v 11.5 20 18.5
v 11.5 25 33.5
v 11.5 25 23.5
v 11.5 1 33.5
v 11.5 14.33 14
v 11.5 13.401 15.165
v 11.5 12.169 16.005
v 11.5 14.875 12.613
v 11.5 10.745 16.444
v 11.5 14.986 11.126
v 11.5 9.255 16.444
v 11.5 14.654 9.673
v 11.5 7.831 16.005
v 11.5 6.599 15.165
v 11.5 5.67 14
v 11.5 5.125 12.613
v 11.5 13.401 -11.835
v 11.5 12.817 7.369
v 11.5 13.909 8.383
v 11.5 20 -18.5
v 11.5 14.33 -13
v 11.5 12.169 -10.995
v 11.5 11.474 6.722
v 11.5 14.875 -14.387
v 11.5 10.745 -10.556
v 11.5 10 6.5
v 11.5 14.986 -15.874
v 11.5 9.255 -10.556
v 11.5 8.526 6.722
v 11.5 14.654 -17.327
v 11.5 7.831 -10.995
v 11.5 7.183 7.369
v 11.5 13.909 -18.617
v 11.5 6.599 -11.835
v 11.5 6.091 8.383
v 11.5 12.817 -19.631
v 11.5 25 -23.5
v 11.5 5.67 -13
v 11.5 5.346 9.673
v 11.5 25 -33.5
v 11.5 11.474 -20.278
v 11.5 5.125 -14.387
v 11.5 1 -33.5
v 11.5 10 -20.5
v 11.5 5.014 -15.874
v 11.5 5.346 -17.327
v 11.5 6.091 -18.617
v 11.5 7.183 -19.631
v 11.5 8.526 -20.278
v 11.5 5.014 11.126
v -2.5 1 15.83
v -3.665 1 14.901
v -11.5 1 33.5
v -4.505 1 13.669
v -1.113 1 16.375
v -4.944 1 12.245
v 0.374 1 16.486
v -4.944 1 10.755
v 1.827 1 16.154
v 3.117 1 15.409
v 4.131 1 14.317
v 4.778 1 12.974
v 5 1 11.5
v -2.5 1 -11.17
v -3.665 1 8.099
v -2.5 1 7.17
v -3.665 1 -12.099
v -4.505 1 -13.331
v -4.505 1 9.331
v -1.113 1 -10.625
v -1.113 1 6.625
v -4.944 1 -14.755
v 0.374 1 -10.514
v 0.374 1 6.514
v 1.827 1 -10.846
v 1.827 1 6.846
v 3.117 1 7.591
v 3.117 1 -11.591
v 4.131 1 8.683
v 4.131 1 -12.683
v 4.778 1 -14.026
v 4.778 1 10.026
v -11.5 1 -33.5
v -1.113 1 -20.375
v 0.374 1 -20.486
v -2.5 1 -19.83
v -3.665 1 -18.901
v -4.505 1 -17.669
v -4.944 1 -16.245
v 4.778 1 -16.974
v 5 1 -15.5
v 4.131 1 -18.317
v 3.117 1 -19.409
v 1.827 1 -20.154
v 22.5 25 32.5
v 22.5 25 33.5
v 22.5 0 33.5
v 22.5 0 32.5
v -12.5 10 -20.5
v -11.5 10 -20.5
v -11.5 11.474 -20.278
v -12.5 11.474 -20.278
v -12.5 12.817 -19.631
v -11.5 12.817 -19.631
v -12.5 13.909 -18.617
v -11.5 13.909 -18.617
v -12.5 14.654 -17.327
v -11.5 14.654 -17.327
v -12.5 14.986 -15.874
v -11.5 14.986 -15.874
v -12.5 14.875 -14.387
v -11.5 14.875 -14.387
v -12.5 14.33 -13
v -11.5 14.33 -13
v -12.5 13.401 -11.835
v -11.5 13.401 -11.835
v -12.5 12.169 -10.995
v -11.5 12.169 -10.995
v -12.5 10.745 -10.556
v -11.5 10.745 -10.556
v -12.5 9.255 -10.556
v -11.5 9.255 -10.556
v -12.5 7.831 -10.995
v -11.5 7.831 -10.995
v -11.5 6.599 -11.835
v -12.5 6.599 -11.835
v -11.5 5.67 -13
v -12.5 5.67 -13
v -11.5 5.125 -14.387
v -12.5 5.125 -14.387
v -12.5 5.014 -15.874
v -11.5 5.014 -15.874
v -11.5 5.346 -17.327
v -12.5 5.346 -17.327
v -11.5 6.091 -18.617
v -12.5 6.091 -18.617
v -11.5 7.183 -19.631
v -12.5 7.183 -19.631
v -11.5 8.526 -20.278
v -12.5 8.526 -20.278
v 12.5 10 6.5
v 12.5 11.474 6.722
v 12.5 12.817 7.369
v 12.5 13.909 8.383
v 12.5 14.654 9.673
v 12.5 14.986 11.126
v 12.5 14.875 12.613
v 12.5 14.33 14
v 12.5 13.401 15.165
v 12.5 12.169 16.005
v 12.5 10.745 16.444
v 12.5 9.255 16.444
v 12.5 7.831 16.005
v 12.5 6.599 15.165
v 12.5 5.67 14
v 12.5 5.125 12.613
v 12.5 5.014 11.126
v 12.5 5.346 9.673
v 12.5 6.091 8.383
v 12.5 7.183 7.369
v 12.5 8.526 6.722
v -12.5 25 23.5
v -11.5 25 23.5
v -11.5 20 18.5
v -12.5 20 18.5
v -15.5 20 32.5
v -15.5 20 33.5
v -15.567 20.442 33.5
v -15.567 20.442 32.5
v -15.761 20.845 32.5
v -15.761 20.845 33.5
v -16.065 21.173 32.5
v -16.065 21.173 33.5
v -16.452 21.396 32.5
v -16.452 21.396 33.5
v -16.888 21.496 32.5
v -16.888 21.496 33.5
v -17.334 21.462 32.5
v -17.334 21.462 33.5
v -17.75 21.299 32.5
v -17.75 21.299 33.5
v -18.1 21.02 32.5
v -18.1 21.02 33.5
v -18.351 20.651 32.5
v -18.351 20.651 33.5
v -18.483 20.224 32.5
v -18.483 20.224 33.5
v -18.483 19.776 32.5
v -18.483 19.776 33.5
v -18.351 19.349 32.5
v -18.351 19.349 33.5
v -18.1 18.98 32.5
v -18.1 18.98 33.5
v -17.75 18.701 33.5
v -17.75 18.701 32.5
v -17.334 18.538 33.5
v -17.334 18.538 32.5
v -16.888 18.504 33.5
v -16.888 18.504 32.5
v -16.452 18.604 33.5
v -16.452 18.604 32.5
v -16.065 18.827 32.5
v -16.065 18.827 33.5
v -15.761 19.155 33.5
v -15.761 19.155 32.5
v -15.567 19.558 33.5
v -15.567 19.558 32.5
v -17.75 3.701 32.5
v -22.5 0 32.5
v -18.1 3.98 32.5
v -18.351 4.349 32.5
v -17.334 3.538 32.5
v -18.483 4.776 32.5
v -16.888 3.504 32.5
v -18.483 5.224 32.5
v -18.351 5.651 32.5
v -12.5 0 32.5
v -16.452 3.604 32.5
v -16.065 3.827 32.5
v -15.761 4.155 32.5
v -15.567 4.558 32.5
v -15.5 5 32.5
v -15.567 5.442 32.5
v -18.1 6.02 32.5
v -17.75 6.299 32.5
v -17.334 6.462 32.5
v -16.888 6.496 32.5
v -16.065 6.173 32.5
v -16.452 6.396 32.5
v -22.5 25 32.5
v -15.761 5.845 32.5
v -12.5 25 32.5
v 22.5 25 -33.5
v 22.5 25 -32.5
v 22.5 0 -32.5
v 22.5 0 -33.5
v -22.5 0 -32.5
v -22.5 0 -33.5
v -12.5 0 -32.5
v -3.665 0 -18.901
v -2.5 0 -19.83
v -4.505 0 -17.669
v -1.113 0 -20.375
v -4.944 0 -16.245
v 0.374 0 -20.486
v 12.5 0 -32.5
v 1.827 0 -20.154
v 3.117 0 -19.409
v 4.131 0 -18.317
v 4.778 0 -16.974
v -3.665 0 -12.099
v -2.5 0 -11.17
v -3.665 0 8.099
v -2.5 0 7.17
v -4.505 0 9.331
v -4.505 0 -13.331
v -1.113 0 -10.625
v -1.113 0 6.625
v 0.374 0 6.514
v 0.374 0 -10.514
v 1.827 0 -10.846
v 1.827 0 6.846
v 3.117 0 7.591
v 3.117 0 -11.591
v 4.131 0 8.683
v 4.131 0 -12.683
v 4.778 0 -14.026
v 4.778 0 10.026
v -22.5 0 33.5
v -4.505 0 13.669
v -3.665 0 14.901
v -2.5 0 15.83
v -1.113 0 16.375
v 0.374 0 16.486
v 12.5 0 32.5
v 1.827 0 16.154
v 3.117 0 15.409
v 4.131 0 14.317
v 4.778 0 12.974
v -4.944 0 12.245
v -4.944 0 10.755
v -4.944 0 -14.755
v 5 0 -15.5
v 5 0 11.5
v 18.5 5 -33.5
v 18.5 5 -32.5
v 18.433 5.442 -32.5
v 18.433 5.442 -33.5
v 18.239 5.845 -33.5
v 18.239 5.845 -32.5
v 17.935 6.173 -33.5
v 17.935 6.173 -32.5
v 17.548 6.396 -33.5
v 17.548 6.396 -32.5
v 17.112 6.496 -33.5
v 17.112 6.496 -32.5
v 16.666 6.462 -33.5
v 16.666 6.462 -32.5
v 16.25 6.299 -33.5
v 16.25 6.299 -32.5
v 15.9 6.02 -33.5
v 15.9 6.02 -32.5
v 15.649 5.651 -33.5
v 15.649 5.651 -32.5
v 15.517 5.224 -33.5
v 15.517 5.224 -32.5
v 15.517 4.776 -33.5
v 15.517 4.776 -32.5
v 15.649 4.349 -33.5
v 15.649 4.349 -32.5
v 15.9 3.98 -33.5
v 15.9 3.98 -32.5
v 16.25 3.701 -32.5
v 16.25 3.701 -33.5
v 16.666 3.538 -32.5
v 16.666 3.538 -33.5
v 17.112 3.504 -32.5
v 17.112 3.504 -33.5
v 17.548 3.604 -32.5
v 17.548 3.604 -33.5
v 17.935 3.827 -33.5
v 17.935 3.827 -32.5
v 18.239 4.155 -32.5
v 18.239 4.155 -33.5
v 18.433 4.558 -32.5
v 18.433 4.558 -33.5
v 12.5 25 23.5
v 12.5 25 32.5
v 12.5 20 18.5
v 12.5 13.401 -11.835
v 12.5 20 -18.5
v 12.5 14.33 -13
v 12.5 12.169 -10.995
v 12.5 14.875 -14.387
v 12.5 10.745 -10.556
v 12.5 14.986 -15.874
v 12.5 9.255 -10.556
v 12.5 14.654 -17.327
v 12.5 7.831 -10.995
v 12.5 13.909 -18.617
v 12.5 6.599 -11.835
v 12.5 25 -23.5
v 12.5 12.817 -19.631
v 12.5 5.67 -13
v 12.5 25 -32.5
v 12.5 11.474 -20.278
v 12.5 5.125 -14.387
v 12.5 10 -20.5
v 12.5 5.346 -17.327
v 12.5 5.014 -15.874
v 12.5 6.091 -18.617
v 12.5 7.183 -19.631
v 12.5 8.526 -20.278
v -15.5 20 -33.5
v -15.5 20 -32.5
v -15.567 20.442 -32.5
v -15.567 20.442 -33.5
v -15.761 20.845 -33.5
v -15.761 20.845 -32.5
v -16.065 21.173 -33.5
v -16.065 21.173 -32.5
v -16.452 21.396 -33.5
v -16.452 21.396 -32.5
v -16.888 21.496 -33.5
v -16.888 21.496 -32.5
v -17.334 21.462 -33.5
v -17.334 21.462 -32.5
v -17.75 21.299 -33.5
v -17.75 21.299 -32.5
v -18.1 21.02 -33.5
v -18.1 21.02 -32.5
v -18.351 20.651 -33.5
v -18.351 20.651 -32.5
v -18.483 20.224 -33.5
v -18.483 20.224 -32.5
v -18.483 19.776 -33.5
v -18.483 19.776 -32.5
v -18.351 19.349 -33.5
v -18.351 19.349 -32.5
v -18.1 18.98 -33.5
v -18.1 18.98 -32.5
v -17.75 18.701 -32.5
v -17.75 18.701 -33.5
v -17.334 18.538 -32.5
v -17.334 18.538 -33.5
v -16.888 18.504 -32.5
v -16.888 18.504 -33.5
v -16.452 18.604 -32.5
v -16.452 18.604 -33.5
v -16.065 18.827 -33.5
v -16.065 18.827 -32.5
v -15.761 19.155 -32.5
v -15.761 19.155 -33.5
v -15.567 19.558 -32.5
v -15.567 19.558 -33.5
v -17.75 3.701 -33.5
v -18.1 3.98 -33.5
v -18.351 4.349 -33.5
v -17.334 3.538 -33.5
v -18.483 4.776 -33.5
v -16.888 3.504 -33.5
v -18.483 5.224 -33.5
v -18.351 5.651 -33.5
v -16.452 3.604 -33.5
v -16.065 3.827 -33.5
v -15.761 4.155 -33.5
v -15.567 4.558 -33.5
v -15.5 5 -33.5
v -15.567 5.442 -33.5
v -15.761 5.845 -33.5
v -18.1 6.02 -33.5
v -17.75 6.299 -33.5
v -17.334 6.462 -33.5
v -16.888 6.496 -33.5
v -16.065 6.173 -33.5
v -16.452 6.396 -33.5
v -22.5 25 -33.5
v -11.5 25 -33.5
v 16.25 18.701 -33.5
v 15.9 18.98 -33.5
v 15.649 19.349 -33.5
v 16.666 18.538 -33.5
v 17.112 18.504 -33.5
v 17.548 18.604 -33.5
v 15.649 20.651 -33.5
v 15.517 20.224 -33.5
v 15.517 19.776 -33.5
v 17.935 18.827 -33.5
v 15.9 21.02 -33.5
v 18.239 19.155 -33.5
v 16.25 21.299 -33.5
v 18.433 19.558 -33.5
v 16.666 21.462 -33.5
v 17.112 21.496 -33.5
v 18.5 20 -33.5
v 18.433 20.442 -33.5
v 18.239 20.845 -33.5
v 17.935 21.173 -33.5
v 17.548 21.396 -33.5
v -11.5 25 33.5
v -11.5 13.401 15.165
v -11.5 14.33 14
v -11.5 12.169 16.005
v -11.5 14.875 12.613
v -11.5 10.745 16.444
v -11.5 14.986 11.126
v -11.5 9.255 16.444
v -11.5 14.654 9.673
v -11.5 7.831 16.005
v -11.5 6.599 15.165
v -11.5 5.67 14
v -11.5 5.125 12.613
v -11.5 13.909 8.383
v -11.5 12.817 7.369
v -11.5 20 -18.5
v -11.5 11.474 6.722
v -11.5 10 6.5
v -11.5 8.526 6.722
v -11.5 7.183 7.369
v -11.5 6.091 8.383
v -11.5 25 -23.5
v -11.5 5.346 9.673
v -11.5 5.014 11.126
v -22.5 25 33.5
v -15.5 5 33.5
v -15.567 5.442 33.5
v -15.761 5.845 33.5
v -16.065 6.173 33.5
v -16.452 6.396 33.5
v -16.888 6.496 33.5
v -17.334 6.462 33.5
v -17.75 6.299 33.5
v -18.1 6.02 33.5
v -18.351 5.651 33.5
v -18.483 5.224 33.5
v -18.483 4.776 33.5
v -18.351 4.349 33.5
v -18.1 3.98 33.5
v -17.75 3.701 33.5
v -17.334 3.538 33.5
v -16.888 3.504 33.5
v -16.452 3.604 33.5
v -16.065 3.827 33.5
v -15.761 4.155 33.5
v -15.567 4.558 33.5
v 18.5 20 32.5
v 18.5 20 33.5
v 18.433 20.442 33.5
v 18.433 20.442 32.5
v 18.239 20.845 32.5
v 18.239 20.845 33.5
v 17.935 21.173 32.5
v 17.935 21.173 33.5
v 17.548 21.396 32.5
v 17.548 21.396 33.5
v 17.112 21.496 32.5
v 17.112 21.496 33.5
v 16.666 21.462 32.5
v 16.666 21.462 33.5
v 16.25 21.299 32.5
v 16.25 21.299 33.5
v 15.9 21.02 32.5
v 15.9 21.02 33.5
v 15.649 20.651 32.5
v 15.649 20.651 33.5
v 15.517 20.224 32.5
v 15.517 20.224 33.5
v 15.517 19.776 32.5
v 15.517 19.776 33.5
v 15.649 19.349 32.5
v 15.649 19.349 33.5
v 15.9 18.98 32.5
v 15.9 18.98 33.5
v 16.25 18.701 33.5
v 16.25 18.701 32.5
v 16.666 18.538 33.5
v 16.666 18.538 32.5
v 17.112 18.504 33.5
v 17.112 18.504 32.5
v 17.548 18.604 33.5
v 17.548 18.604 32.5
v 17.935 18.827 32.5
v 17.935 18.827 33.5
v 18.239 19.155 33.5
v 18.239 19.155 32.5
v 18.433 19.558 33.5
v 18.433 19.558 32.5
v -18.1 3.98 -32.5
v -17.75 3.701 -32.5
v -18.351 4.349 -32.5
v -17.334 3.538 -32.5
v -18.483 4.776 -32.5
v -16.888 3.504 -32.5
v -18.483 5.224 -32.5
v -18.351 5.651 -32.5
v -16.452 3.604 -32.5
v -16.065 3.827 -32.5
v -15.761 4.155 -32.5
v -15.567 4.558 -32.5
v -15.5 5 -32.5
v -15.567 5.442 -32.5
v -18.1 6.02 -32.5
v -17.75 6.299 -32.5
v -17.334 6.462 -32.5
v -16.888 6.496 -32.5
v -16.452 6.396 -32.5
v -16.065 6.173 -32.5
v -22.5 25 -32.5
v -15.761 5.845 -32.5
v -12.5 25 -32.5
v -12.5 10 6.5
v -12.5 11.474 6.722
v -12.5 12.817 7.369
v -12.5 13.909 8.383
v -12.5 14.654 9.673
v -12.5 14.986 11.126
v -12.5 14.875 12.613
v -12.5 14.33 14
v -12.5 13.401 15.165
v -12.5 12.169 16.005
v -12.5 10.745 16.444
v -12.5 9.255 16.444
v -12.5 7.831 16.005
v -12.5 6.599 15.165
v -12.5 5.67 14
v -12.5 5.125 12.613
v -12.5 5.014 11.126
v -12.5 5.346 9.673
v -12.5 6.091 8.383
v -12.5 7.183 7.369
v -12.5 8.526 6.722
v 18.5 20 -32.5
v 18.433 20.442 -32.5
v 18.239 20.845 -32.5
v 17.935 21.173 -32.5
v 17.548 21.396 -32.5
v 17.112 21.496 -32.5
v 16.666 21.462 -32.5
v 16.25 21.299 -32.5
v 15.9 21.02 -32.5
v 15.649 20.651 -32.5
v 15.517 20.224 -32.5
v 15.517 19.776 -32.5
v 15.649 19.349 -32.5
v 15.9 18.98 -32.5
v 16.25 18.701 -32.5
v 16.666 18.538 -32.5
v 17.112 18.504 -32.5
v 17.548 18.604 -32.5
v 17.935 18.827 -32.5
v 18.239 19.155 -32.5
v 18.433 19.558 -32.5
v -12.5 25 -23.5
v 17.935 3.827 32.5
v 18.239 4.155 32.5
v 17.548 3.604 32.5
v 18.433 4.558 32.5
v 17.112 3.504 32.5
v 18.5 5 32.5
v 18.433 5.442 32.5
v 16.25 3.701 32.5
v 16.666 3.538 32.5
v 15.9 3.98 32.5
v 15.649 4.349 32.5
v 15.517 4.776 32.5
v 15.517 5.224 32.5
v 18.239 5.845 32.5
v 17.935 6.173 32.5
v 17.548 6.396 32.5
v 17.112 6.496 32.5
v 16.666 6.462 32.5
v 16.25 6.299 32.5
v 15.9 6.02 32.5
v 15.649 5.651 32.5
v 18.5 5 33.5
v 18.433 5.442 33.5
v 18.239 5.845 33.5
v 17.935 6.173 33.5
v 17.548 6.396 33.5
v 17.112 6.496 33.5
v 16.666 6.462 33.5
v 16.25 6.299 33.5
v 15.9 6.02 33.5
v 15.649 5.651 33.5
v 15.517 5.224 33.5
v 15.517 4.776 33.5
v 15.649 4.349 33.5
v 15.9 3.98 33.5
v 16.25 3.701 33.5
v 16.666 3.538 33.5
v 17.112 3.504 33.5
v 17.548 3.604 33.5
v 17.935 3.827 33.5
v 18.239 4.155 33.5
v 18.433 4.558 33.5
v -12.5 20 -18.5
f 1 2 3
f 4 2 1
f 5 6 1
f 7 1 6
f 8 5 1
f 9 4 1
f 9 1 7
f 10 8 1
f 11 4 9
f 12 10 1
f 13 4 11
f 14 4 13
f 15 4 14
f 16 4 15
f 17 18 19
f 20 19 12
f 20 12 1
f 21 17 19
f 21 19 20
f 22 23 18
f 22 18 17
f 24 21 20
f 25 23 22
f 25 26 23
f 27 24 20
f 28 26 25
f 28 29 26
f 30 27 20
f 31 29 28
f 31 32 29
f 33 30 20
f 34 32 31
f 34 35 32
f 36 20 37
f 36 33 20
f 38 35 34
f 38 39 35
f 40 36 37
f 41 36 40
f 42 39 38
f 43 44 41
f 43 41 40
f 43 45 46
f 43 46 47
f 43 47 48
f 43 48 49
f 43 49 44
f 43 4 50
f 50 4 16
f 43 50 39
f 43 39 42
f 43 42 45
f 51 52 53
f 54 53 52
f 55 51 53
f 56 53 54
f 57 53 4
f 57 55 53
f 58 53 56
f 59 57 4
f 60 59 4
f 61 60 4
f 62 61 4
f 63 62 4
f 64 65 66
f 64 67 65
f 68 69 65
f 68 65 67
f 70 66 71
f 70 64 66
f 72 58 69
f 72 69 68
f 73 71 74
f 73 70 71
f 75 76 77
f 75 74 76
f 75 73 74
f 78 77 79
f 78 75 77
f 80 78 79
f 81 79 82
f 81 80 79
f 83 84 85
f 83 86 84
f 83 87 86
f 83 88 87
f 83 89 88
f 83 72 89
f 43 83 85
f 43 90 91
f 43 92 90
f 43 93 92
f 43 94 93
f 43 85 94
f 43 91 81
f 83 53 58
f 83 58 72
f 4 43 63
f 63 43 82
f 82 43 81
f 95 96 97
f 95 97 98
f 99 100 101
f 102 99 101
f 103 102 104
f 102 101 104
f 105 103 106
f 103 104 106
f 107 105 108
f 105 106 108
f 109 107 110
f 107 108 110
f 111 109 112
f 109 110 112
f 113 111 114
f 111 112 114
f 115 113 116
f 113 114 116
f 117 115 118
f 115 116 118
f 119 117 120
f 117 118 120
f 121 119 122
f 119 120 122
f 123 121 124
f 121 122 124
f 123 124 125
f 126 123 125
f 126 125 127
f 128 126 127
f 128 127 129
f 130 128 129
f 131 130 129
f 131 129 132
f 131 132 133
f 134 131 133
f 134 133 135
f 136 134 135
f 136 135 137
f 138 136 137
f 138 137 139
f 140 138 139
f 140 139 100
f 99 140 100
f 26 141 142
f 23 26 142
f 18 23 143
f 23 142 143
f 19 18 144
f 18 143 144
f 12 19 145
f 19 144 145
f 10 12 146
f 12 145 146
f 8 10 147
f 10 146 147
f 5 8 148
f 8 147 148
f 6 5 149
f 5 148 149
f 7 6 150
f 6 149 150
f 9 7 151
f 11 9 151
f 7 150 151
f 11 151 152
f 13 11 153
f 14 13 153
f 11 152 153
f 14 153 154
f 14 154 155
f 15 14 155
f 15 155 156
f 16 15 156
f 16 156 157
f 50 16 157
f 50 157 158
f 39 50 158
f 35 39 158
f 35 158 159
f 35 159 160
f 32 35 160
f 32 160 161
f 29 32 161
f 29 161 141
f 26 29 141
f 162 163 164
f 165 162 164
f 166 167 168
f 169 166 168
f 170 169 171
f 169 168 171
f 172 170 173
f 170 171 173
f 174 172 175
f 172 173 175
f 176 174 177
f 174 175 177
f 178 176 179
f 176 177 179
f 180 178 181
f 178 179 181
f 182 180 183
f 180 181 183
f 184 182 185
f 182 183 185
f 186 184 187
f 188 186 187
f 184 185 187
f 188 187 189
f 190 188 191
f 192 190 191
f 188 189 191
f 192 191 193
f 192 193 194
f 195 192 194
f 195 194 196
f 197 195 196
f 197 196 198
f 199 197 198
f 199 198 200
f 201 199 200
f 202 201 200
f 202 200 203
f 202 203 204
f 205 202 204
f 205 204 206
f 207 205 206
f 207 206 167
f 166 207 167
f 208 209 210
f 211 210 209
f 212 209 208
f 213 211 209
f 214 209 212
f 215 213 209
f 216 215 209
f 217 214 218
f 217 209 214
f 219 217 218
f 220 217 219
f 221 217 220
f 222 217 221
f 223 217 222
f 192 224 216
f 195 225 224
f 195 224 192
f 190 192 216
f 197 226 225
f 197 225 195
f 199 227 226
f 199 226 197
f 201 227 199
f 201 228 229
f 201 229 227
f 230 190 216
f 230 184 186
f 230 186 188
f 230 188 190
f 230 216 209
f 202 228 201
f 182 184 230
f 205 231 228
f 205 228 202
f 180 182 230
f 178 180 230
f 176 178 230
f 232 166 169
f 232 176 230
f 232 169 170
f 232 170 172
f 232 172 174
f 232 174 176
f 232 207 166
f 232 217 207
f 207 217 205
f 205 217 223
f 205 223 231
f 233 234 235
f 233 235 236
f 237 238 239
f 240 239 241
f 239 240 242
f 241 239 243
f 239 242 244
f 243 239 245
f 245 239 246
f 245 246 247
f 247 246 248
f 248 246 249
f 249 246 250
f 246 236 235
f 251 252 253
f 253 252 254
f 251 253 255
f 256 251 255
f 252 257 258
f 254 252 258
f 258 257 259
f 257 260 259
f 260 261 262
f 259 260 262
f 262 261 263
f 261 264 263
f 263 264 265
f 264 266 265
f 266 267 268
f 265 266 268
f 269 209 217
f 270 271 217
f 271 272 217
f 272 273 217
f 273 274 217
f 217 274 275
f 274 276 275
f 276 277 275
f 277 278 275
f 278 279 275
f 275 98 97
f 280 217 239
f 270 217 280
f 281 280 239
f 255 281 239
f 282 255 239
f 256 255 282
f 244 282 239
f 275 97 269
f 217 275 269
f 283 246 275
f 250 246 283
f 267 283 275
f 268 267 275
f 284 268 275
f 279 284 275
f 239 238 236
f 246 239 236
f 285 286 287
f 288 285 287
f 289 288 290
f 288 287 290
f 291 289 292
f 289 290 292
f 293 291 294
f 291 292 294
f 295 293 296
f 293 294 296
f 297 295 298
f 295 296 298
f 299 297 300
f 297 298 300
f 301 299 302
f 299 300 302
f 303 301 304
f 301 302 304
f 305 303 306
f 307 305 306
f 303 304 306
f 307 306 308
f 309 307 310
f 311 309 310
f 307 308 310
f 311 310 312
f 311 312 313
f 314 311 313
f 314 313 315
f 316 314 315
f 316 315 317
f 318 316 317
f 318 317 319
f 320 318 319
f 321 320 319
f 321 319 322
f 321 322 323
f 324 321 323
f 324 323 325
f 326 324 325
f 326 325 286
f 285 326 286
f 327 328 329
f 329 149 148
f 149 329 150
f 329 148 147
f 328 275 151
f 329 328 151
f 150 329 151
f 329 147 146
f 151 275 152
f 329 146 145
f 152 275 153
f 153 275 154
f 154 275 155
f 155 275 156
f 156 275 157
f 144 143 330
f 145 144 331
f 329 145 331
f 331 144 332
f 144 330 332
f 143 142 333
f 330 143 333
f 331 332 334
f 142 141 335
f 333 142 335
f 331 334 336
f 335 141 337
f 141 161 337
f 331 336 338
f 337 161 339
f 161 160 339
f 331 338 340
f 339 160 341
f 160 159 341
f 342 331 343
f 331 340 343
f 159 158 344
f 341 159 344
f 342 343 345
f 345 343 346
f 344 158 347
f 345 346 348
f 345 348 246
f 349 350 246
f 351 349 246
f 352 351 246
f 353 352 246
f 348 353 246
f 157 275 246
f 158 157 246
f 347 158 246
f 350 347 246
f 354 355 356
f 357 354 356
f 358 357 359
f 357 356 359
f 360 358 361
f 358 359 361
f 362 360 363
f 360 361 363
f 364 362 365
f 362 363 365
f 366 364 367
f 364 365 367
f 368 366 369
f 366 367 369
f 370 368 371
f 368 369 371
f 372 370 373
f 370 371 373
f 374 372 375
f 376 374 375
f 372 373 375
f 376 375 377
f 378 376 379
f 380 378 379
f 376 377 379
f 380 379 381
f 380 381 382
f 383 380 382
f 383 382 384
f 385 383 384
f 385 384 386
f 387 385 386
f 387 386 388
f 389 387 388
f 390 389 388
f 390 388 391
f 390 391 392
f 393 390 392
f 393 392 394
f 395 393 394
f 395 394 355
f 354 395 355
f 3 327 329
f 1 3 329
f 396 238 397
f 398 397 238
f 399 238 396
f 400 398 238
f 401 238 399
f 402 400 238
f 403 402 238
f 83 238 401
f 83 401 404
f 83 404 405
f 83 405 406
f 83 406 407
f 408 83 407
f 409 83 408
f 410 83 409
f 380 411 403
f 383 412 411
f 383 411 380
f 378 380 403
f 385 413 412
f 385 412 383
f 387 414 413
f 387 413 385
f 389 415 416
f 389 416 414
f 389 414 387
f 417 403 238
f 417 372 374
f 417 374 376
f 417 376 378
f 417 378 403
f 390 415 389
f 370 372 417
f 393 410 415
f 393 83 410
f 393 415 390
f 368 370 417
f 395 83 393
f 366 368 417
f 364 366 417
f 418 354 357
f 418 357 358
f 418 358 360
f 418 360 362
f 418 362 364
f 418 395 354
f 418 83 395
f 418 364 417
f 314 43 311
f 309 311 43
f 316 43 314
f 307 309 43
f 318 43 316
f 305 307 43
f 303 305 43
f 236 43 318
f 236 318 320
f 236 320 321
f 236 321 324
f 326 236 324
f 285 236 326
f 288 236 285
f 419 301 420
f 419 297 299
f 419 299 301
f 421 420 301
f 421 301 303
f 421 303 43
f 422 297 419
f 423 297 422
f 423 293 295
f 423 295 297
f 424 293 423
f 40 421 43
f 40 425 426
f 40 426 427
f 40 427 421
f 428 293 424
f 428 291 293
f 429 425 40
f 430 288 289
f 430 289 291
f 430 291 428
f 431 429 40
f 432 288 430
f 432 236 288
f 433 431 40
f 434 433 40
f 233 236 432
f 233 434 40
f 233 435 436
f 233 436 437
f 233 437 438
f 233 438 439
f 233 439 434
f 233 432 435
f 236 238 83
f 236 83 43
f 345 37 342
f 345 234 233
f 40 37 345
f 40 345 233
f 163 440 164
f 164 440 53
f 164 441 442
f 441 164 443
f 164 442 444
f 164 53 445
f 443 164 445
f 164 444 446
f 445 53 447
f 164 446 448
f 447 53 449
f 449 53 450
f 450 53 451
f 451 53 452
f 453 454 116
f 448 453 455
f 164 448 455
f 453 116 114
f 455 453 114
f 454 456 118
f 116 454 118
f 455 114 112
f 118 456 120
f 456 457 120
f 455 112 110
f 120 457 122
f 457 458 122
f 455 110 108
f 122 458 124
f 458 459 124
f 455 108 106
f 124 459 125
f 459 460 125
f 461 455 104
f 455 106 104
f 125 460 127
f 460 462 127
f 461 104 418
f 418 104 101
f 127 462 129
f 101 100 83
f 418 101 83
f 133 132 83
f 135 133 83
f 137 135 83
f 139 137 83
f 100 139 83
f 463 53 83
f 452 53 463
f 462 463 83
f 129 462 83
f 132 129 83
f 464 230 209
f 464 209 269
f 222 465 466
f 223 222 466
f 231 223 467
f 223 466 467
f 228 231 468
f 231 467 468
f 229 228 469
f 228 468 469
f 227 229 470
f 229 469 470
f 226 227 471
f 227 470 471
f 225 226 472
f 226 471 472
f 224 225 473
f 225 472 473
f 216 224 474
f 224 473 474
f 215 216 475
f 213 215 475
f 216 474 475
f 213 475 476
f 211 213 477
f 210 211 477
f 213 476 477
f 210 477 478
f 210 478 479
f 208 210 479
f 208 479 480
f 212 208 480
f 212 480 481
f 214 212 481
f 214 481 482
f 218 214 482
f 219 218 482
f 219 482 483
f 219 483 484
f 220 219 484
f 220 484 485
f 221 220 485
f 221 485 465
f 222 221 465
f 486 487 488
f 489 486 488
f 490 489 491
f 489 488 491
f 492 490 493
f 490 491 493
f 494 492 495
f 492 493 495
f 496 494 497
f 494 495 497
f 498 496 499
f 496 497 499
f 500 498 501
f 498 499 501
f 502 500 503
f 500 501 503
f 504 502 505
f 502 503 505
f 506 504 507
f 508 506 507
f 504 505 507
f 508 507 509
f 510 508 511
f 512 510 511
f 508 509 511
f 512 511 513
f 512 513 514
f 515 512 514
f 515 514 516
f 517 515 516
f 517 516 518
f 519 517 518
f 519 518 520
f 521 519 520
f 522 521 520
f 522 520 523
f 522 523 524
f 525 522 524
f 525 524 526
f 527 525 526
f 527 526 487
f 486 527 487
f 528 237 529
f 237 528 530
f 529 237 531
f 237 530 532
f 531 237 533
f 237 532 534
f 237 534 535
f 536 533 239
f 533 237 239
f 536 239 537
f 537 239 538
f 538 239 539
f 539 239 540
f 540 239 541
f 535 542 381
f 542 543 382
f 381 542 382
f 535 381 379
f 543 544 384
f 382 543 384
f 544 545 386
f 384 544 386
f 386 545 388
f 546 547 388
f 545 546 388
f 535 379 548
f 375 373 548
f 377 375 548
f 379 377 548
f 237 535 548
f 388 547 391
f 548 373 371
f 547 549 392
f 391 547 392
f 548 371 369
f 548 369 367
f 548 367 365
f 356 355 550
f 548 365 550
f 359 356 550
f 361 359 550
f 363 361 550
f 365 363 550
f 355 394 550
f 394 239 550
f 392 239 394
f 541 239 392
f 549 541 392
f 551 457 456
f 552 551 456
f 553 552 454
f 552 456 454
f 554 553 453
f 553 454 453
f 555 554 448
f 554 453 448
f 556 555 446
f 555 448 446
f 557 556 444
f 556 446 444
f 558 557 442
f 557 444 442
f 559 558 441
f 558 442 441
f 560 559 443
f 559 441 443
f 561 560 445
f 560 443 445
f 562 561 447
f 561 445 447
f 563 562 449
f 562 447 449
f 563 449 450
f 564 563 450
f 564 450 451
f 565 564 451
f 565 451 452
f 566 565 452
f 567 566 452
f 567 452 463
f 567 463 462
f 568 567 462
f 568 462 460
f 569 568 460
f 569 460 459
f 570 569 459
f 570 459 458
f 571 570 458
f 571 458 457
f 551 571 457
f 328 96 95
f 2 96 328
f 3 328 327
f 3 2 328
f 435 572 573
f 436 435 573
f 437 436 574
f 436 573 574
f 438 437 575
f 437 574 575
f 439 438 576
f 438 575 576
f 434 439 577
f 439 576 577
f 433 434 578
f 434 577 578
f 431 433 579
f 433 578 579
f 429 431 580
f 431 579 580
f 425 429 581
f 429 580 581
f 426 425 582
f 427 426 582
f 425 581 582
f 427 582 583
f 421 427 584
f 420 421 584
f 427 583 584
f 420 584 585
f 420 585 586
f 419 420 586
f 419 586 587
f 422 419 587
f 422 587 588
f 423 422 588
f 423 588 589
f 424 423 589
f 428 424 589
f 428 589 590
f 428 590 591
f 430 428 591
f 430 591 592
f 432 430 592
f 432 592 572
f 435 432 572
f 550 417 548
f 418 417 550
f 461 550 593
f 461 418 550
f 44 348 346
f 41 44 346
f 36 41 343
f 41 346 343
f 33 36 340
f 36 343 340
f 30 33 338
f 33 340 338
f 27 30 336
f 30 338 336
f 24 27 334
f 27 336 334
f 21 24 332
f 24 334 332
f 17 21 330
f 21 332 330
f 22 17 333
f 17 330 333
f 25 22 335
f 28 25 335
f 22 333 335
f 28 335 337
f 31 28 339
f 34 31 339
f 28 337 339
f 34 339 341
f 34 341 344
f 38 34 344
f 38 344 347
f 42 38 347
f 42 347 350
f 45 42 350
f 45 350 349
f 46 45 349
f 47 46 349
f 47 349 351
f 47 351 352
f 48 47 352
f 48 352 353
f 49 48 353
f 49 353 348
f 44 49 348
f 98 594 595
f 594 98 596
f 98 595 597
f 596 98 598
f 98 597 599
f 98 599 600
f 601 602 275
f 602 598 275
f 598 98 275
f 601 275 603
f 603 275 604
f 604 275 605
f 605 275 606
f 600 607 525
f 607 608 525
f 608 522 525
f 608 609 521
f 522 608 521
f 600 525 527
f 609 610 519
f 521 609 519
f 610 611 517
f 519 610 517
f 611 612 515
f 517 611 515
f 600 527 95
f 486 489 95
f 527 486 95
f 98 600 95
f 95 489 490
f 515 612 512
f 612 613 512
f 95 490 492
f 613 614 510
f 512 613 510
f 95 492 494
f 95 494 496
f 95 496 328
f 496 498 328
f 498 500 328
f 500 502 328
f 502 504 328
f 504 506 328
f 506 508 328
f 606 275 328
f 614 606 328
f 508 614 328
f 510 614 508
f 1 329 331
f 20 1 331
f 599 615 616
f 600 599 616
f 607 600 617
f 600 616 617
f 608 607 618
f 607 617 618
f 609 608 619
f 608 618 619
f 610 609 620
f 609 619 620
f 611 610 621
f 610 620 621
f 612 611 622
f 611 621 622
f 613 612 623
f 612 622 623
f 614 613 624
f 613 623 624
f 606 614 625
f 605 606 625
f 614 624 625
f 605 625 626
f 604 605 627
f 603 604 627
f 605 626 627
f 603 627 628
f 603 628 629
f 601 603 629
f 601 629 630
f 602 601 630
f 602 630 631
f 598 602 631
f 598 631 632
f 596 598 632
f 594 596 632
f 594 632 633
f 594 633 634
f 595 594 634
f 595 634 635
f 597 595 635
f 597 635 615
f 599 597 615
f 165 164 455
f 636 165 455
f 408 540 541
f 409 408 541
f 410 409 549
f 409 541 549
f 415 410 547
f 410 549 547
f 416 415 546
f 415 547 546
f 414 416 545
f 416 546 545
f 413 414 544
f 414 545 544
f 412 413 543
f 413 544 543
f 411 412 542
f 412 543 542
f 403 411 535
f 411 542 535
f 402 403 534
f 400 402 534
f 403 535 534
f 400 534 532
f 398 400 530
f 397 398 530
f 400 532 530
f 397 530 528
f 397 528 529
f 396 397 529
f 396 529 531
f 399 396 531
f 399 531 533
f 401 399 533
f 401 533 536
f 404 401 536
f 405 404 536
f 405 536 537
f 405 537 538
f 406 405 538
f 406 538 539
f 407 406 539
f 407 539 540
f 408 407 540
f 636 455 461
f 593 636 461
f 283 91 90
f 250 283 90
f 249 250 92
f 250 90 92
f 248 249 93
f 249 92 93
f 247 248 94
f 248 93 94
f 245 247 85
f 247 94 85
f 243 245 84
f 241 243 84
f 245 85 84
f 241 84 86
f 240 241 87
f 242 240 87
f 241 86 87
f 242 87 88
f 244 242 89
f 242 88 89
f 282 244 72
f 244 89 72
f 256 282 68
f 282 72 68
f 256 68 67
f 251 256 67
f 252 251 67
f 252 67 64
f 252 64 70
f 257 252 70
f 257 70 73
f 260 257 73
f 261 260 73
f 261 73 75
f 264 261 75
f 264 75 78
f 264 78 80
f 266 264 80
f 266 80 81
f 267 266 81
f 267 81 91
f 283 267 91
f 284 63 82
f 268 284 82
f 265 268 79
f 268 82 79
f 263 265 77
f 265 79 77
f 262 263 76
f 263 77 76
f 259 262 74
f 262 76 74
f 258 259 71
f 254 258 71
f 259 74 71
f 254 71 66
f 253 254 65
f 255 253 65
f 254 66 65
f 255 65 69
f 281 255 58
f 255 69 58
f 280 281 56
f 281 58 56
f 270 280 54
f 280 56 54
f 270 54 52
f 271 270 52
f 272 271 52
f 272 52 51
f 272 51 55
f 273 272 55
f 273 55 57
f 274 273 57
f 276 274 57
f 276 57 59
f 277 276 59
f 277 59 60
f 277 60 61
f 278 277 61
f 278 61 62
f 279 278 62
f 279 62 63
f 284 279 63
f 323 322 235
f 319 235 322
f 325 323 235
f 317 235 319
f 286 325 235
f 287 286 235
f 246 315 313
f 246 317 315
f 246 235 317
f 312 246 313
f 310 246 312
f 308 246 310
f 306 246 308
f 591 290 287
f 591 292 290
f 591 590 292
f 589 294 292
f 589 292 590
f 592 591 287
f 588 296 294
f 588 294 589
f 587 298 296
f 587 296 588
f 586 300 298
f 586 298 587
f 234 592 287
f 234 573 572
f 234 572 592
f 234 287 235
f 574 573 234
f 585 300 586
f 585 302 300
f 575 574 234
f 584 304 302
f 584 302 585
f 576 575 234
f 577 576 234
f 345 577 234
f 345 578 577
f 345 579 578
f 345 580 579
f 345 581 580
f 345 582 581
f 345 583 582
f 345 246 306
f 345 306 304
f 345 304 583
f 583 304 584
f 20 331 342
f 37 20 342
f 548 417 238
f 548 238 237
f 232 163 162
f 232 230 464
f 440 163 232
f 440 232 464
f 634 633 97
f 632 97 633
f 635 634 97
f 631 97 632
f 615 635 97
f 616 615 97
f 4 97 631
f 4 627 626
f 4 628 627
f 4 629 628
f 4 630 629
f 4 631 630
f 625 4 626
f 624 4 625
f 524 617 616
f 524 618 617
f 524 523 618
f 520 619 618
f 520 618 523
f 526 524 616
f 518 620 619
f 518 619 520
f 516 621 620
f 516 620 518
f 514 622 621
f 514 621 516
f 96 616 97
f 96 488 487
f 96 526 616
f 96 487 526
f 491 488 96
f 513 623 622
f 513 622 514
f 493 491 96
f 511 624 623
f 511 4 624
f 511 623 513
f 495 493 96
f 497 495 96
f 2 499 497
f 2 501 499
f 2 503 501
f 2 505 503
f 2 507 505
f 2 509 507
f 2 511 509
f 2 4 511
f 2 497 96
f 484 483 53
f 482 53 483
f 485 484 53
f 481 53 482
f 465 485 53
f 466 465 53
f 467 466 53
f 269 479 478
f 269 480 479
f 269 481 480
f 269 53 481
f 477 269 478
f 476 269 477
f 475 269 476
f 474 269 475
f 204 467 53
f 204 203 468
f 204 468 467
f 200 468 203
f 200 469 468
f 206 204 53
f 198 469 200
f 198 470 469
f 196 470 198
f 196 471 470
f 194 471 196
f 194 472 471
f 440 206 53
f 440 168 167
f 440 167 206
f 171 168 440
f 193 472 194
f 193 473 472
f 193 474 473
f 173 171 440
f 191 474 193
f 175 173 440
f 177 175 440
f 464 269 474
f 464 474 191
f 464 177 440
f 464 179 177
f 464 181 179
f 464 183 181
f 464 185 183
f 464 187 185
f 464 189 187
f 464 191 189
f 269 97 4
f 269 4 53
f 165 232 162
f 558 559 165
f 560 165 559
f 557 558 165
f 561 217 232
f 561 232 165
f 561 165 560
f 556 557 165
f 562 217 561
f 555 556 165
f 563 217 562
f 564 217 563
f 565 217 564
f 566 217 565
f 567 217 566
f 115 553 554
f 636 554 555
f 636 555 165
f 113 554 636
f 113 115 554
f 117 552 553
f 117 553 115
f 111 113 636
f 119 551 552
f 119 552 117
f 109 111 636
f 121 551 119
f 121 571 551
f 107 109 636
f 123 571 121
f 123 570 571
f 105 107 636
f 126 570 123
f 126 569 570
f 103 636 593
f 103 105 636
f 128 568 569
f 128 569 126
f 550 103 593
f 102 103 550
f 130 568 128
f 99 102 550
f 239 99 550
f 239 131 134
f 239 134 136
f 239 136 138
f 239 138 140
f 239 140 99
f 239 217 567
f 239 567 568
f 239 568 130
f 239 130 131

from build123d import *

# Parameters (mm, degrees)
SKETCH1_W               = 25
SKETCH1_H               = 67
BOSS_EXTRUDE1_DEPTH     = 1
SKETCH2_W               = 1
SKETCH2_H               = 67
BOSS_EXTRUDE2_DEPTH     = 24
SKETCH3_W               = 1
SKETCH3_H               = 25
BOSS_EXTRUDE3_DEPTH     = 10
SKETCH4_W               = 1
SKETCH4_H               = 25
BOSS_EXTRUDE4_DEPTH     = 10
SKETCH5_R               = 5
CUT_EXTRUDE1_DEPTH      = 2
SKETCH10_R              = 1.5
CUT_EXTRUDE3_DEPTH      = 68
CUT_EXTRUDE4_DEPTH      = 11
CUT_EXTRUDE4_DEPTH_BACK = 36
SKETCH9_R               = 5
CUT_EXTRUDE2_DEPTH      = 36


with BuildPart() as part:
    # Sketch1 → Boss-Extrude1 (new body)
    with BuildSketch(Plane(origin=(0, 0, 0), x_dir=(1, 0, 0), z_dir=(0, 1, 0))):
        Rectangle(SKETCH1_W, SKETCH1_H)
    extrude(amount=BOSS_EXTRUDE1_DEPTH)

    # Sketch2 → Boss-Extrude2 (add)
    with BuildSketch(Plane(origin=(0, 1, 0), x_dir=(1, 0, 0), z_dir=(0, 1, 0))):
        with Locations((12, 0)):
            Rectangle(SKETCH2_W, SKETCH2_H)
        with Locations((-12, 0)):
            Rectangle(SKETCH2_W, SKETCH2_H)
    extrude(amount=BOSS_EXTRUDE2_DEPTH)

    # Sketch3 → Boss-Extrude3 (add)
    with BuildSketch(Plane(origin=(12.5, 0, 0), x_dir=(0, 0, -1), z_dir=(1, 0, 0))):
        with Locations((-33, 12.5)):
            Rectangle(SKETCH3_W, SKETCH3_H)
        with Locations((33, 12.5)):
            Rectangle(SKETCH3_W, SKETCH3_H)
    extrude(amount=BOSS_EXTRUDE3_DEPTH)

    # Sketch4 → Boss-Extrude4 (add)
    with BuildSketch(Plane.ZY.offset(12.5)):
        with Locations((-33, 12.5)):
            Rectangle(SKETCH4_W, SKETCH4_H)
        with Locations((33, 12.5)):
            Rectangle(SKETCH4_W, SKETCH4_H)
    extrude(amount=BOSS_EXTRUDE4_DEPTH)

    # Sketch5 → Cut-Extrude1 (cut, through all)
    with BuildSketch(Plane(origin=(0, 1, 0), x_dir=(1, 0, 0), z_dir=(0, 1, 0))):
        with Locations((0, -11.5)):
            Circle(SKETCH5_R)
        with Locations((0, 15.5)):
            Circle(SKETCH5_R)
    extrude(amount=-CUT_EXTRUDE1_DEPTH, mode=Mode.SUBTRACT)

    # Sketch10 → Cut-Extrude3 (cut, through all)
    with BuildSketch(Plane.XY.offset(33.5)):
        with Locations((17, 20)):
            Circle(SKETCH10_R)
        with Locations((17, 5)):
            Circle(SKETCH10_R)
        with Locations((-17, 20)):
            Circle(SKETCH10_R)
        with Locations((-17, 5)):
            Circle(SKETCH10_R)
    extrude(amount=-CUT_EXTRUDE3_DEPTH, mode=Mode.SUBTRACT)

    # Sketch11 → Cut-Extrude4 (cut, two sides)
    with BuildSketch(Plane(origin=(12.5, 0, 0), x_dir=(0, 0, -1), z_dir=(1, 0, 0))) as cut_extrude4_sk:
        Polygon((0, 25), (-23.5, 25), (-18.5, 20), (0, 20), align=None)
        Polygon((23.5, 25), (0, 25), (0, 20), (18.5, 20), align=None)
    extrude(amount=CUT_EXTRUDE4_DEPTH, mode=Mode.SUBTRACT)
    extrude(cut_extrude4_sk.sketch, amount=-CUT_EXTRUDE4_DEPTH_BACK, mode=Mode.SUBTRACT)

    # Sketch9 → Cut-Extrude2 (cut, through all)
    with BuildSketch(Plane(origin=(12.5, 0, 0), x_dir=(0, 0, -1), z_dir=(1, 0, 0))):
        with Locations((-11.5, 10)):
            Circle(SKETCH9_R)
        with Locations((15.5, 10)):
            Circle(SKETCH9_R)
    extrude(amount=-CUT_EXTRUDE2_DEPTH, mode=Mode.SUBTRACT)


solid = part.part
